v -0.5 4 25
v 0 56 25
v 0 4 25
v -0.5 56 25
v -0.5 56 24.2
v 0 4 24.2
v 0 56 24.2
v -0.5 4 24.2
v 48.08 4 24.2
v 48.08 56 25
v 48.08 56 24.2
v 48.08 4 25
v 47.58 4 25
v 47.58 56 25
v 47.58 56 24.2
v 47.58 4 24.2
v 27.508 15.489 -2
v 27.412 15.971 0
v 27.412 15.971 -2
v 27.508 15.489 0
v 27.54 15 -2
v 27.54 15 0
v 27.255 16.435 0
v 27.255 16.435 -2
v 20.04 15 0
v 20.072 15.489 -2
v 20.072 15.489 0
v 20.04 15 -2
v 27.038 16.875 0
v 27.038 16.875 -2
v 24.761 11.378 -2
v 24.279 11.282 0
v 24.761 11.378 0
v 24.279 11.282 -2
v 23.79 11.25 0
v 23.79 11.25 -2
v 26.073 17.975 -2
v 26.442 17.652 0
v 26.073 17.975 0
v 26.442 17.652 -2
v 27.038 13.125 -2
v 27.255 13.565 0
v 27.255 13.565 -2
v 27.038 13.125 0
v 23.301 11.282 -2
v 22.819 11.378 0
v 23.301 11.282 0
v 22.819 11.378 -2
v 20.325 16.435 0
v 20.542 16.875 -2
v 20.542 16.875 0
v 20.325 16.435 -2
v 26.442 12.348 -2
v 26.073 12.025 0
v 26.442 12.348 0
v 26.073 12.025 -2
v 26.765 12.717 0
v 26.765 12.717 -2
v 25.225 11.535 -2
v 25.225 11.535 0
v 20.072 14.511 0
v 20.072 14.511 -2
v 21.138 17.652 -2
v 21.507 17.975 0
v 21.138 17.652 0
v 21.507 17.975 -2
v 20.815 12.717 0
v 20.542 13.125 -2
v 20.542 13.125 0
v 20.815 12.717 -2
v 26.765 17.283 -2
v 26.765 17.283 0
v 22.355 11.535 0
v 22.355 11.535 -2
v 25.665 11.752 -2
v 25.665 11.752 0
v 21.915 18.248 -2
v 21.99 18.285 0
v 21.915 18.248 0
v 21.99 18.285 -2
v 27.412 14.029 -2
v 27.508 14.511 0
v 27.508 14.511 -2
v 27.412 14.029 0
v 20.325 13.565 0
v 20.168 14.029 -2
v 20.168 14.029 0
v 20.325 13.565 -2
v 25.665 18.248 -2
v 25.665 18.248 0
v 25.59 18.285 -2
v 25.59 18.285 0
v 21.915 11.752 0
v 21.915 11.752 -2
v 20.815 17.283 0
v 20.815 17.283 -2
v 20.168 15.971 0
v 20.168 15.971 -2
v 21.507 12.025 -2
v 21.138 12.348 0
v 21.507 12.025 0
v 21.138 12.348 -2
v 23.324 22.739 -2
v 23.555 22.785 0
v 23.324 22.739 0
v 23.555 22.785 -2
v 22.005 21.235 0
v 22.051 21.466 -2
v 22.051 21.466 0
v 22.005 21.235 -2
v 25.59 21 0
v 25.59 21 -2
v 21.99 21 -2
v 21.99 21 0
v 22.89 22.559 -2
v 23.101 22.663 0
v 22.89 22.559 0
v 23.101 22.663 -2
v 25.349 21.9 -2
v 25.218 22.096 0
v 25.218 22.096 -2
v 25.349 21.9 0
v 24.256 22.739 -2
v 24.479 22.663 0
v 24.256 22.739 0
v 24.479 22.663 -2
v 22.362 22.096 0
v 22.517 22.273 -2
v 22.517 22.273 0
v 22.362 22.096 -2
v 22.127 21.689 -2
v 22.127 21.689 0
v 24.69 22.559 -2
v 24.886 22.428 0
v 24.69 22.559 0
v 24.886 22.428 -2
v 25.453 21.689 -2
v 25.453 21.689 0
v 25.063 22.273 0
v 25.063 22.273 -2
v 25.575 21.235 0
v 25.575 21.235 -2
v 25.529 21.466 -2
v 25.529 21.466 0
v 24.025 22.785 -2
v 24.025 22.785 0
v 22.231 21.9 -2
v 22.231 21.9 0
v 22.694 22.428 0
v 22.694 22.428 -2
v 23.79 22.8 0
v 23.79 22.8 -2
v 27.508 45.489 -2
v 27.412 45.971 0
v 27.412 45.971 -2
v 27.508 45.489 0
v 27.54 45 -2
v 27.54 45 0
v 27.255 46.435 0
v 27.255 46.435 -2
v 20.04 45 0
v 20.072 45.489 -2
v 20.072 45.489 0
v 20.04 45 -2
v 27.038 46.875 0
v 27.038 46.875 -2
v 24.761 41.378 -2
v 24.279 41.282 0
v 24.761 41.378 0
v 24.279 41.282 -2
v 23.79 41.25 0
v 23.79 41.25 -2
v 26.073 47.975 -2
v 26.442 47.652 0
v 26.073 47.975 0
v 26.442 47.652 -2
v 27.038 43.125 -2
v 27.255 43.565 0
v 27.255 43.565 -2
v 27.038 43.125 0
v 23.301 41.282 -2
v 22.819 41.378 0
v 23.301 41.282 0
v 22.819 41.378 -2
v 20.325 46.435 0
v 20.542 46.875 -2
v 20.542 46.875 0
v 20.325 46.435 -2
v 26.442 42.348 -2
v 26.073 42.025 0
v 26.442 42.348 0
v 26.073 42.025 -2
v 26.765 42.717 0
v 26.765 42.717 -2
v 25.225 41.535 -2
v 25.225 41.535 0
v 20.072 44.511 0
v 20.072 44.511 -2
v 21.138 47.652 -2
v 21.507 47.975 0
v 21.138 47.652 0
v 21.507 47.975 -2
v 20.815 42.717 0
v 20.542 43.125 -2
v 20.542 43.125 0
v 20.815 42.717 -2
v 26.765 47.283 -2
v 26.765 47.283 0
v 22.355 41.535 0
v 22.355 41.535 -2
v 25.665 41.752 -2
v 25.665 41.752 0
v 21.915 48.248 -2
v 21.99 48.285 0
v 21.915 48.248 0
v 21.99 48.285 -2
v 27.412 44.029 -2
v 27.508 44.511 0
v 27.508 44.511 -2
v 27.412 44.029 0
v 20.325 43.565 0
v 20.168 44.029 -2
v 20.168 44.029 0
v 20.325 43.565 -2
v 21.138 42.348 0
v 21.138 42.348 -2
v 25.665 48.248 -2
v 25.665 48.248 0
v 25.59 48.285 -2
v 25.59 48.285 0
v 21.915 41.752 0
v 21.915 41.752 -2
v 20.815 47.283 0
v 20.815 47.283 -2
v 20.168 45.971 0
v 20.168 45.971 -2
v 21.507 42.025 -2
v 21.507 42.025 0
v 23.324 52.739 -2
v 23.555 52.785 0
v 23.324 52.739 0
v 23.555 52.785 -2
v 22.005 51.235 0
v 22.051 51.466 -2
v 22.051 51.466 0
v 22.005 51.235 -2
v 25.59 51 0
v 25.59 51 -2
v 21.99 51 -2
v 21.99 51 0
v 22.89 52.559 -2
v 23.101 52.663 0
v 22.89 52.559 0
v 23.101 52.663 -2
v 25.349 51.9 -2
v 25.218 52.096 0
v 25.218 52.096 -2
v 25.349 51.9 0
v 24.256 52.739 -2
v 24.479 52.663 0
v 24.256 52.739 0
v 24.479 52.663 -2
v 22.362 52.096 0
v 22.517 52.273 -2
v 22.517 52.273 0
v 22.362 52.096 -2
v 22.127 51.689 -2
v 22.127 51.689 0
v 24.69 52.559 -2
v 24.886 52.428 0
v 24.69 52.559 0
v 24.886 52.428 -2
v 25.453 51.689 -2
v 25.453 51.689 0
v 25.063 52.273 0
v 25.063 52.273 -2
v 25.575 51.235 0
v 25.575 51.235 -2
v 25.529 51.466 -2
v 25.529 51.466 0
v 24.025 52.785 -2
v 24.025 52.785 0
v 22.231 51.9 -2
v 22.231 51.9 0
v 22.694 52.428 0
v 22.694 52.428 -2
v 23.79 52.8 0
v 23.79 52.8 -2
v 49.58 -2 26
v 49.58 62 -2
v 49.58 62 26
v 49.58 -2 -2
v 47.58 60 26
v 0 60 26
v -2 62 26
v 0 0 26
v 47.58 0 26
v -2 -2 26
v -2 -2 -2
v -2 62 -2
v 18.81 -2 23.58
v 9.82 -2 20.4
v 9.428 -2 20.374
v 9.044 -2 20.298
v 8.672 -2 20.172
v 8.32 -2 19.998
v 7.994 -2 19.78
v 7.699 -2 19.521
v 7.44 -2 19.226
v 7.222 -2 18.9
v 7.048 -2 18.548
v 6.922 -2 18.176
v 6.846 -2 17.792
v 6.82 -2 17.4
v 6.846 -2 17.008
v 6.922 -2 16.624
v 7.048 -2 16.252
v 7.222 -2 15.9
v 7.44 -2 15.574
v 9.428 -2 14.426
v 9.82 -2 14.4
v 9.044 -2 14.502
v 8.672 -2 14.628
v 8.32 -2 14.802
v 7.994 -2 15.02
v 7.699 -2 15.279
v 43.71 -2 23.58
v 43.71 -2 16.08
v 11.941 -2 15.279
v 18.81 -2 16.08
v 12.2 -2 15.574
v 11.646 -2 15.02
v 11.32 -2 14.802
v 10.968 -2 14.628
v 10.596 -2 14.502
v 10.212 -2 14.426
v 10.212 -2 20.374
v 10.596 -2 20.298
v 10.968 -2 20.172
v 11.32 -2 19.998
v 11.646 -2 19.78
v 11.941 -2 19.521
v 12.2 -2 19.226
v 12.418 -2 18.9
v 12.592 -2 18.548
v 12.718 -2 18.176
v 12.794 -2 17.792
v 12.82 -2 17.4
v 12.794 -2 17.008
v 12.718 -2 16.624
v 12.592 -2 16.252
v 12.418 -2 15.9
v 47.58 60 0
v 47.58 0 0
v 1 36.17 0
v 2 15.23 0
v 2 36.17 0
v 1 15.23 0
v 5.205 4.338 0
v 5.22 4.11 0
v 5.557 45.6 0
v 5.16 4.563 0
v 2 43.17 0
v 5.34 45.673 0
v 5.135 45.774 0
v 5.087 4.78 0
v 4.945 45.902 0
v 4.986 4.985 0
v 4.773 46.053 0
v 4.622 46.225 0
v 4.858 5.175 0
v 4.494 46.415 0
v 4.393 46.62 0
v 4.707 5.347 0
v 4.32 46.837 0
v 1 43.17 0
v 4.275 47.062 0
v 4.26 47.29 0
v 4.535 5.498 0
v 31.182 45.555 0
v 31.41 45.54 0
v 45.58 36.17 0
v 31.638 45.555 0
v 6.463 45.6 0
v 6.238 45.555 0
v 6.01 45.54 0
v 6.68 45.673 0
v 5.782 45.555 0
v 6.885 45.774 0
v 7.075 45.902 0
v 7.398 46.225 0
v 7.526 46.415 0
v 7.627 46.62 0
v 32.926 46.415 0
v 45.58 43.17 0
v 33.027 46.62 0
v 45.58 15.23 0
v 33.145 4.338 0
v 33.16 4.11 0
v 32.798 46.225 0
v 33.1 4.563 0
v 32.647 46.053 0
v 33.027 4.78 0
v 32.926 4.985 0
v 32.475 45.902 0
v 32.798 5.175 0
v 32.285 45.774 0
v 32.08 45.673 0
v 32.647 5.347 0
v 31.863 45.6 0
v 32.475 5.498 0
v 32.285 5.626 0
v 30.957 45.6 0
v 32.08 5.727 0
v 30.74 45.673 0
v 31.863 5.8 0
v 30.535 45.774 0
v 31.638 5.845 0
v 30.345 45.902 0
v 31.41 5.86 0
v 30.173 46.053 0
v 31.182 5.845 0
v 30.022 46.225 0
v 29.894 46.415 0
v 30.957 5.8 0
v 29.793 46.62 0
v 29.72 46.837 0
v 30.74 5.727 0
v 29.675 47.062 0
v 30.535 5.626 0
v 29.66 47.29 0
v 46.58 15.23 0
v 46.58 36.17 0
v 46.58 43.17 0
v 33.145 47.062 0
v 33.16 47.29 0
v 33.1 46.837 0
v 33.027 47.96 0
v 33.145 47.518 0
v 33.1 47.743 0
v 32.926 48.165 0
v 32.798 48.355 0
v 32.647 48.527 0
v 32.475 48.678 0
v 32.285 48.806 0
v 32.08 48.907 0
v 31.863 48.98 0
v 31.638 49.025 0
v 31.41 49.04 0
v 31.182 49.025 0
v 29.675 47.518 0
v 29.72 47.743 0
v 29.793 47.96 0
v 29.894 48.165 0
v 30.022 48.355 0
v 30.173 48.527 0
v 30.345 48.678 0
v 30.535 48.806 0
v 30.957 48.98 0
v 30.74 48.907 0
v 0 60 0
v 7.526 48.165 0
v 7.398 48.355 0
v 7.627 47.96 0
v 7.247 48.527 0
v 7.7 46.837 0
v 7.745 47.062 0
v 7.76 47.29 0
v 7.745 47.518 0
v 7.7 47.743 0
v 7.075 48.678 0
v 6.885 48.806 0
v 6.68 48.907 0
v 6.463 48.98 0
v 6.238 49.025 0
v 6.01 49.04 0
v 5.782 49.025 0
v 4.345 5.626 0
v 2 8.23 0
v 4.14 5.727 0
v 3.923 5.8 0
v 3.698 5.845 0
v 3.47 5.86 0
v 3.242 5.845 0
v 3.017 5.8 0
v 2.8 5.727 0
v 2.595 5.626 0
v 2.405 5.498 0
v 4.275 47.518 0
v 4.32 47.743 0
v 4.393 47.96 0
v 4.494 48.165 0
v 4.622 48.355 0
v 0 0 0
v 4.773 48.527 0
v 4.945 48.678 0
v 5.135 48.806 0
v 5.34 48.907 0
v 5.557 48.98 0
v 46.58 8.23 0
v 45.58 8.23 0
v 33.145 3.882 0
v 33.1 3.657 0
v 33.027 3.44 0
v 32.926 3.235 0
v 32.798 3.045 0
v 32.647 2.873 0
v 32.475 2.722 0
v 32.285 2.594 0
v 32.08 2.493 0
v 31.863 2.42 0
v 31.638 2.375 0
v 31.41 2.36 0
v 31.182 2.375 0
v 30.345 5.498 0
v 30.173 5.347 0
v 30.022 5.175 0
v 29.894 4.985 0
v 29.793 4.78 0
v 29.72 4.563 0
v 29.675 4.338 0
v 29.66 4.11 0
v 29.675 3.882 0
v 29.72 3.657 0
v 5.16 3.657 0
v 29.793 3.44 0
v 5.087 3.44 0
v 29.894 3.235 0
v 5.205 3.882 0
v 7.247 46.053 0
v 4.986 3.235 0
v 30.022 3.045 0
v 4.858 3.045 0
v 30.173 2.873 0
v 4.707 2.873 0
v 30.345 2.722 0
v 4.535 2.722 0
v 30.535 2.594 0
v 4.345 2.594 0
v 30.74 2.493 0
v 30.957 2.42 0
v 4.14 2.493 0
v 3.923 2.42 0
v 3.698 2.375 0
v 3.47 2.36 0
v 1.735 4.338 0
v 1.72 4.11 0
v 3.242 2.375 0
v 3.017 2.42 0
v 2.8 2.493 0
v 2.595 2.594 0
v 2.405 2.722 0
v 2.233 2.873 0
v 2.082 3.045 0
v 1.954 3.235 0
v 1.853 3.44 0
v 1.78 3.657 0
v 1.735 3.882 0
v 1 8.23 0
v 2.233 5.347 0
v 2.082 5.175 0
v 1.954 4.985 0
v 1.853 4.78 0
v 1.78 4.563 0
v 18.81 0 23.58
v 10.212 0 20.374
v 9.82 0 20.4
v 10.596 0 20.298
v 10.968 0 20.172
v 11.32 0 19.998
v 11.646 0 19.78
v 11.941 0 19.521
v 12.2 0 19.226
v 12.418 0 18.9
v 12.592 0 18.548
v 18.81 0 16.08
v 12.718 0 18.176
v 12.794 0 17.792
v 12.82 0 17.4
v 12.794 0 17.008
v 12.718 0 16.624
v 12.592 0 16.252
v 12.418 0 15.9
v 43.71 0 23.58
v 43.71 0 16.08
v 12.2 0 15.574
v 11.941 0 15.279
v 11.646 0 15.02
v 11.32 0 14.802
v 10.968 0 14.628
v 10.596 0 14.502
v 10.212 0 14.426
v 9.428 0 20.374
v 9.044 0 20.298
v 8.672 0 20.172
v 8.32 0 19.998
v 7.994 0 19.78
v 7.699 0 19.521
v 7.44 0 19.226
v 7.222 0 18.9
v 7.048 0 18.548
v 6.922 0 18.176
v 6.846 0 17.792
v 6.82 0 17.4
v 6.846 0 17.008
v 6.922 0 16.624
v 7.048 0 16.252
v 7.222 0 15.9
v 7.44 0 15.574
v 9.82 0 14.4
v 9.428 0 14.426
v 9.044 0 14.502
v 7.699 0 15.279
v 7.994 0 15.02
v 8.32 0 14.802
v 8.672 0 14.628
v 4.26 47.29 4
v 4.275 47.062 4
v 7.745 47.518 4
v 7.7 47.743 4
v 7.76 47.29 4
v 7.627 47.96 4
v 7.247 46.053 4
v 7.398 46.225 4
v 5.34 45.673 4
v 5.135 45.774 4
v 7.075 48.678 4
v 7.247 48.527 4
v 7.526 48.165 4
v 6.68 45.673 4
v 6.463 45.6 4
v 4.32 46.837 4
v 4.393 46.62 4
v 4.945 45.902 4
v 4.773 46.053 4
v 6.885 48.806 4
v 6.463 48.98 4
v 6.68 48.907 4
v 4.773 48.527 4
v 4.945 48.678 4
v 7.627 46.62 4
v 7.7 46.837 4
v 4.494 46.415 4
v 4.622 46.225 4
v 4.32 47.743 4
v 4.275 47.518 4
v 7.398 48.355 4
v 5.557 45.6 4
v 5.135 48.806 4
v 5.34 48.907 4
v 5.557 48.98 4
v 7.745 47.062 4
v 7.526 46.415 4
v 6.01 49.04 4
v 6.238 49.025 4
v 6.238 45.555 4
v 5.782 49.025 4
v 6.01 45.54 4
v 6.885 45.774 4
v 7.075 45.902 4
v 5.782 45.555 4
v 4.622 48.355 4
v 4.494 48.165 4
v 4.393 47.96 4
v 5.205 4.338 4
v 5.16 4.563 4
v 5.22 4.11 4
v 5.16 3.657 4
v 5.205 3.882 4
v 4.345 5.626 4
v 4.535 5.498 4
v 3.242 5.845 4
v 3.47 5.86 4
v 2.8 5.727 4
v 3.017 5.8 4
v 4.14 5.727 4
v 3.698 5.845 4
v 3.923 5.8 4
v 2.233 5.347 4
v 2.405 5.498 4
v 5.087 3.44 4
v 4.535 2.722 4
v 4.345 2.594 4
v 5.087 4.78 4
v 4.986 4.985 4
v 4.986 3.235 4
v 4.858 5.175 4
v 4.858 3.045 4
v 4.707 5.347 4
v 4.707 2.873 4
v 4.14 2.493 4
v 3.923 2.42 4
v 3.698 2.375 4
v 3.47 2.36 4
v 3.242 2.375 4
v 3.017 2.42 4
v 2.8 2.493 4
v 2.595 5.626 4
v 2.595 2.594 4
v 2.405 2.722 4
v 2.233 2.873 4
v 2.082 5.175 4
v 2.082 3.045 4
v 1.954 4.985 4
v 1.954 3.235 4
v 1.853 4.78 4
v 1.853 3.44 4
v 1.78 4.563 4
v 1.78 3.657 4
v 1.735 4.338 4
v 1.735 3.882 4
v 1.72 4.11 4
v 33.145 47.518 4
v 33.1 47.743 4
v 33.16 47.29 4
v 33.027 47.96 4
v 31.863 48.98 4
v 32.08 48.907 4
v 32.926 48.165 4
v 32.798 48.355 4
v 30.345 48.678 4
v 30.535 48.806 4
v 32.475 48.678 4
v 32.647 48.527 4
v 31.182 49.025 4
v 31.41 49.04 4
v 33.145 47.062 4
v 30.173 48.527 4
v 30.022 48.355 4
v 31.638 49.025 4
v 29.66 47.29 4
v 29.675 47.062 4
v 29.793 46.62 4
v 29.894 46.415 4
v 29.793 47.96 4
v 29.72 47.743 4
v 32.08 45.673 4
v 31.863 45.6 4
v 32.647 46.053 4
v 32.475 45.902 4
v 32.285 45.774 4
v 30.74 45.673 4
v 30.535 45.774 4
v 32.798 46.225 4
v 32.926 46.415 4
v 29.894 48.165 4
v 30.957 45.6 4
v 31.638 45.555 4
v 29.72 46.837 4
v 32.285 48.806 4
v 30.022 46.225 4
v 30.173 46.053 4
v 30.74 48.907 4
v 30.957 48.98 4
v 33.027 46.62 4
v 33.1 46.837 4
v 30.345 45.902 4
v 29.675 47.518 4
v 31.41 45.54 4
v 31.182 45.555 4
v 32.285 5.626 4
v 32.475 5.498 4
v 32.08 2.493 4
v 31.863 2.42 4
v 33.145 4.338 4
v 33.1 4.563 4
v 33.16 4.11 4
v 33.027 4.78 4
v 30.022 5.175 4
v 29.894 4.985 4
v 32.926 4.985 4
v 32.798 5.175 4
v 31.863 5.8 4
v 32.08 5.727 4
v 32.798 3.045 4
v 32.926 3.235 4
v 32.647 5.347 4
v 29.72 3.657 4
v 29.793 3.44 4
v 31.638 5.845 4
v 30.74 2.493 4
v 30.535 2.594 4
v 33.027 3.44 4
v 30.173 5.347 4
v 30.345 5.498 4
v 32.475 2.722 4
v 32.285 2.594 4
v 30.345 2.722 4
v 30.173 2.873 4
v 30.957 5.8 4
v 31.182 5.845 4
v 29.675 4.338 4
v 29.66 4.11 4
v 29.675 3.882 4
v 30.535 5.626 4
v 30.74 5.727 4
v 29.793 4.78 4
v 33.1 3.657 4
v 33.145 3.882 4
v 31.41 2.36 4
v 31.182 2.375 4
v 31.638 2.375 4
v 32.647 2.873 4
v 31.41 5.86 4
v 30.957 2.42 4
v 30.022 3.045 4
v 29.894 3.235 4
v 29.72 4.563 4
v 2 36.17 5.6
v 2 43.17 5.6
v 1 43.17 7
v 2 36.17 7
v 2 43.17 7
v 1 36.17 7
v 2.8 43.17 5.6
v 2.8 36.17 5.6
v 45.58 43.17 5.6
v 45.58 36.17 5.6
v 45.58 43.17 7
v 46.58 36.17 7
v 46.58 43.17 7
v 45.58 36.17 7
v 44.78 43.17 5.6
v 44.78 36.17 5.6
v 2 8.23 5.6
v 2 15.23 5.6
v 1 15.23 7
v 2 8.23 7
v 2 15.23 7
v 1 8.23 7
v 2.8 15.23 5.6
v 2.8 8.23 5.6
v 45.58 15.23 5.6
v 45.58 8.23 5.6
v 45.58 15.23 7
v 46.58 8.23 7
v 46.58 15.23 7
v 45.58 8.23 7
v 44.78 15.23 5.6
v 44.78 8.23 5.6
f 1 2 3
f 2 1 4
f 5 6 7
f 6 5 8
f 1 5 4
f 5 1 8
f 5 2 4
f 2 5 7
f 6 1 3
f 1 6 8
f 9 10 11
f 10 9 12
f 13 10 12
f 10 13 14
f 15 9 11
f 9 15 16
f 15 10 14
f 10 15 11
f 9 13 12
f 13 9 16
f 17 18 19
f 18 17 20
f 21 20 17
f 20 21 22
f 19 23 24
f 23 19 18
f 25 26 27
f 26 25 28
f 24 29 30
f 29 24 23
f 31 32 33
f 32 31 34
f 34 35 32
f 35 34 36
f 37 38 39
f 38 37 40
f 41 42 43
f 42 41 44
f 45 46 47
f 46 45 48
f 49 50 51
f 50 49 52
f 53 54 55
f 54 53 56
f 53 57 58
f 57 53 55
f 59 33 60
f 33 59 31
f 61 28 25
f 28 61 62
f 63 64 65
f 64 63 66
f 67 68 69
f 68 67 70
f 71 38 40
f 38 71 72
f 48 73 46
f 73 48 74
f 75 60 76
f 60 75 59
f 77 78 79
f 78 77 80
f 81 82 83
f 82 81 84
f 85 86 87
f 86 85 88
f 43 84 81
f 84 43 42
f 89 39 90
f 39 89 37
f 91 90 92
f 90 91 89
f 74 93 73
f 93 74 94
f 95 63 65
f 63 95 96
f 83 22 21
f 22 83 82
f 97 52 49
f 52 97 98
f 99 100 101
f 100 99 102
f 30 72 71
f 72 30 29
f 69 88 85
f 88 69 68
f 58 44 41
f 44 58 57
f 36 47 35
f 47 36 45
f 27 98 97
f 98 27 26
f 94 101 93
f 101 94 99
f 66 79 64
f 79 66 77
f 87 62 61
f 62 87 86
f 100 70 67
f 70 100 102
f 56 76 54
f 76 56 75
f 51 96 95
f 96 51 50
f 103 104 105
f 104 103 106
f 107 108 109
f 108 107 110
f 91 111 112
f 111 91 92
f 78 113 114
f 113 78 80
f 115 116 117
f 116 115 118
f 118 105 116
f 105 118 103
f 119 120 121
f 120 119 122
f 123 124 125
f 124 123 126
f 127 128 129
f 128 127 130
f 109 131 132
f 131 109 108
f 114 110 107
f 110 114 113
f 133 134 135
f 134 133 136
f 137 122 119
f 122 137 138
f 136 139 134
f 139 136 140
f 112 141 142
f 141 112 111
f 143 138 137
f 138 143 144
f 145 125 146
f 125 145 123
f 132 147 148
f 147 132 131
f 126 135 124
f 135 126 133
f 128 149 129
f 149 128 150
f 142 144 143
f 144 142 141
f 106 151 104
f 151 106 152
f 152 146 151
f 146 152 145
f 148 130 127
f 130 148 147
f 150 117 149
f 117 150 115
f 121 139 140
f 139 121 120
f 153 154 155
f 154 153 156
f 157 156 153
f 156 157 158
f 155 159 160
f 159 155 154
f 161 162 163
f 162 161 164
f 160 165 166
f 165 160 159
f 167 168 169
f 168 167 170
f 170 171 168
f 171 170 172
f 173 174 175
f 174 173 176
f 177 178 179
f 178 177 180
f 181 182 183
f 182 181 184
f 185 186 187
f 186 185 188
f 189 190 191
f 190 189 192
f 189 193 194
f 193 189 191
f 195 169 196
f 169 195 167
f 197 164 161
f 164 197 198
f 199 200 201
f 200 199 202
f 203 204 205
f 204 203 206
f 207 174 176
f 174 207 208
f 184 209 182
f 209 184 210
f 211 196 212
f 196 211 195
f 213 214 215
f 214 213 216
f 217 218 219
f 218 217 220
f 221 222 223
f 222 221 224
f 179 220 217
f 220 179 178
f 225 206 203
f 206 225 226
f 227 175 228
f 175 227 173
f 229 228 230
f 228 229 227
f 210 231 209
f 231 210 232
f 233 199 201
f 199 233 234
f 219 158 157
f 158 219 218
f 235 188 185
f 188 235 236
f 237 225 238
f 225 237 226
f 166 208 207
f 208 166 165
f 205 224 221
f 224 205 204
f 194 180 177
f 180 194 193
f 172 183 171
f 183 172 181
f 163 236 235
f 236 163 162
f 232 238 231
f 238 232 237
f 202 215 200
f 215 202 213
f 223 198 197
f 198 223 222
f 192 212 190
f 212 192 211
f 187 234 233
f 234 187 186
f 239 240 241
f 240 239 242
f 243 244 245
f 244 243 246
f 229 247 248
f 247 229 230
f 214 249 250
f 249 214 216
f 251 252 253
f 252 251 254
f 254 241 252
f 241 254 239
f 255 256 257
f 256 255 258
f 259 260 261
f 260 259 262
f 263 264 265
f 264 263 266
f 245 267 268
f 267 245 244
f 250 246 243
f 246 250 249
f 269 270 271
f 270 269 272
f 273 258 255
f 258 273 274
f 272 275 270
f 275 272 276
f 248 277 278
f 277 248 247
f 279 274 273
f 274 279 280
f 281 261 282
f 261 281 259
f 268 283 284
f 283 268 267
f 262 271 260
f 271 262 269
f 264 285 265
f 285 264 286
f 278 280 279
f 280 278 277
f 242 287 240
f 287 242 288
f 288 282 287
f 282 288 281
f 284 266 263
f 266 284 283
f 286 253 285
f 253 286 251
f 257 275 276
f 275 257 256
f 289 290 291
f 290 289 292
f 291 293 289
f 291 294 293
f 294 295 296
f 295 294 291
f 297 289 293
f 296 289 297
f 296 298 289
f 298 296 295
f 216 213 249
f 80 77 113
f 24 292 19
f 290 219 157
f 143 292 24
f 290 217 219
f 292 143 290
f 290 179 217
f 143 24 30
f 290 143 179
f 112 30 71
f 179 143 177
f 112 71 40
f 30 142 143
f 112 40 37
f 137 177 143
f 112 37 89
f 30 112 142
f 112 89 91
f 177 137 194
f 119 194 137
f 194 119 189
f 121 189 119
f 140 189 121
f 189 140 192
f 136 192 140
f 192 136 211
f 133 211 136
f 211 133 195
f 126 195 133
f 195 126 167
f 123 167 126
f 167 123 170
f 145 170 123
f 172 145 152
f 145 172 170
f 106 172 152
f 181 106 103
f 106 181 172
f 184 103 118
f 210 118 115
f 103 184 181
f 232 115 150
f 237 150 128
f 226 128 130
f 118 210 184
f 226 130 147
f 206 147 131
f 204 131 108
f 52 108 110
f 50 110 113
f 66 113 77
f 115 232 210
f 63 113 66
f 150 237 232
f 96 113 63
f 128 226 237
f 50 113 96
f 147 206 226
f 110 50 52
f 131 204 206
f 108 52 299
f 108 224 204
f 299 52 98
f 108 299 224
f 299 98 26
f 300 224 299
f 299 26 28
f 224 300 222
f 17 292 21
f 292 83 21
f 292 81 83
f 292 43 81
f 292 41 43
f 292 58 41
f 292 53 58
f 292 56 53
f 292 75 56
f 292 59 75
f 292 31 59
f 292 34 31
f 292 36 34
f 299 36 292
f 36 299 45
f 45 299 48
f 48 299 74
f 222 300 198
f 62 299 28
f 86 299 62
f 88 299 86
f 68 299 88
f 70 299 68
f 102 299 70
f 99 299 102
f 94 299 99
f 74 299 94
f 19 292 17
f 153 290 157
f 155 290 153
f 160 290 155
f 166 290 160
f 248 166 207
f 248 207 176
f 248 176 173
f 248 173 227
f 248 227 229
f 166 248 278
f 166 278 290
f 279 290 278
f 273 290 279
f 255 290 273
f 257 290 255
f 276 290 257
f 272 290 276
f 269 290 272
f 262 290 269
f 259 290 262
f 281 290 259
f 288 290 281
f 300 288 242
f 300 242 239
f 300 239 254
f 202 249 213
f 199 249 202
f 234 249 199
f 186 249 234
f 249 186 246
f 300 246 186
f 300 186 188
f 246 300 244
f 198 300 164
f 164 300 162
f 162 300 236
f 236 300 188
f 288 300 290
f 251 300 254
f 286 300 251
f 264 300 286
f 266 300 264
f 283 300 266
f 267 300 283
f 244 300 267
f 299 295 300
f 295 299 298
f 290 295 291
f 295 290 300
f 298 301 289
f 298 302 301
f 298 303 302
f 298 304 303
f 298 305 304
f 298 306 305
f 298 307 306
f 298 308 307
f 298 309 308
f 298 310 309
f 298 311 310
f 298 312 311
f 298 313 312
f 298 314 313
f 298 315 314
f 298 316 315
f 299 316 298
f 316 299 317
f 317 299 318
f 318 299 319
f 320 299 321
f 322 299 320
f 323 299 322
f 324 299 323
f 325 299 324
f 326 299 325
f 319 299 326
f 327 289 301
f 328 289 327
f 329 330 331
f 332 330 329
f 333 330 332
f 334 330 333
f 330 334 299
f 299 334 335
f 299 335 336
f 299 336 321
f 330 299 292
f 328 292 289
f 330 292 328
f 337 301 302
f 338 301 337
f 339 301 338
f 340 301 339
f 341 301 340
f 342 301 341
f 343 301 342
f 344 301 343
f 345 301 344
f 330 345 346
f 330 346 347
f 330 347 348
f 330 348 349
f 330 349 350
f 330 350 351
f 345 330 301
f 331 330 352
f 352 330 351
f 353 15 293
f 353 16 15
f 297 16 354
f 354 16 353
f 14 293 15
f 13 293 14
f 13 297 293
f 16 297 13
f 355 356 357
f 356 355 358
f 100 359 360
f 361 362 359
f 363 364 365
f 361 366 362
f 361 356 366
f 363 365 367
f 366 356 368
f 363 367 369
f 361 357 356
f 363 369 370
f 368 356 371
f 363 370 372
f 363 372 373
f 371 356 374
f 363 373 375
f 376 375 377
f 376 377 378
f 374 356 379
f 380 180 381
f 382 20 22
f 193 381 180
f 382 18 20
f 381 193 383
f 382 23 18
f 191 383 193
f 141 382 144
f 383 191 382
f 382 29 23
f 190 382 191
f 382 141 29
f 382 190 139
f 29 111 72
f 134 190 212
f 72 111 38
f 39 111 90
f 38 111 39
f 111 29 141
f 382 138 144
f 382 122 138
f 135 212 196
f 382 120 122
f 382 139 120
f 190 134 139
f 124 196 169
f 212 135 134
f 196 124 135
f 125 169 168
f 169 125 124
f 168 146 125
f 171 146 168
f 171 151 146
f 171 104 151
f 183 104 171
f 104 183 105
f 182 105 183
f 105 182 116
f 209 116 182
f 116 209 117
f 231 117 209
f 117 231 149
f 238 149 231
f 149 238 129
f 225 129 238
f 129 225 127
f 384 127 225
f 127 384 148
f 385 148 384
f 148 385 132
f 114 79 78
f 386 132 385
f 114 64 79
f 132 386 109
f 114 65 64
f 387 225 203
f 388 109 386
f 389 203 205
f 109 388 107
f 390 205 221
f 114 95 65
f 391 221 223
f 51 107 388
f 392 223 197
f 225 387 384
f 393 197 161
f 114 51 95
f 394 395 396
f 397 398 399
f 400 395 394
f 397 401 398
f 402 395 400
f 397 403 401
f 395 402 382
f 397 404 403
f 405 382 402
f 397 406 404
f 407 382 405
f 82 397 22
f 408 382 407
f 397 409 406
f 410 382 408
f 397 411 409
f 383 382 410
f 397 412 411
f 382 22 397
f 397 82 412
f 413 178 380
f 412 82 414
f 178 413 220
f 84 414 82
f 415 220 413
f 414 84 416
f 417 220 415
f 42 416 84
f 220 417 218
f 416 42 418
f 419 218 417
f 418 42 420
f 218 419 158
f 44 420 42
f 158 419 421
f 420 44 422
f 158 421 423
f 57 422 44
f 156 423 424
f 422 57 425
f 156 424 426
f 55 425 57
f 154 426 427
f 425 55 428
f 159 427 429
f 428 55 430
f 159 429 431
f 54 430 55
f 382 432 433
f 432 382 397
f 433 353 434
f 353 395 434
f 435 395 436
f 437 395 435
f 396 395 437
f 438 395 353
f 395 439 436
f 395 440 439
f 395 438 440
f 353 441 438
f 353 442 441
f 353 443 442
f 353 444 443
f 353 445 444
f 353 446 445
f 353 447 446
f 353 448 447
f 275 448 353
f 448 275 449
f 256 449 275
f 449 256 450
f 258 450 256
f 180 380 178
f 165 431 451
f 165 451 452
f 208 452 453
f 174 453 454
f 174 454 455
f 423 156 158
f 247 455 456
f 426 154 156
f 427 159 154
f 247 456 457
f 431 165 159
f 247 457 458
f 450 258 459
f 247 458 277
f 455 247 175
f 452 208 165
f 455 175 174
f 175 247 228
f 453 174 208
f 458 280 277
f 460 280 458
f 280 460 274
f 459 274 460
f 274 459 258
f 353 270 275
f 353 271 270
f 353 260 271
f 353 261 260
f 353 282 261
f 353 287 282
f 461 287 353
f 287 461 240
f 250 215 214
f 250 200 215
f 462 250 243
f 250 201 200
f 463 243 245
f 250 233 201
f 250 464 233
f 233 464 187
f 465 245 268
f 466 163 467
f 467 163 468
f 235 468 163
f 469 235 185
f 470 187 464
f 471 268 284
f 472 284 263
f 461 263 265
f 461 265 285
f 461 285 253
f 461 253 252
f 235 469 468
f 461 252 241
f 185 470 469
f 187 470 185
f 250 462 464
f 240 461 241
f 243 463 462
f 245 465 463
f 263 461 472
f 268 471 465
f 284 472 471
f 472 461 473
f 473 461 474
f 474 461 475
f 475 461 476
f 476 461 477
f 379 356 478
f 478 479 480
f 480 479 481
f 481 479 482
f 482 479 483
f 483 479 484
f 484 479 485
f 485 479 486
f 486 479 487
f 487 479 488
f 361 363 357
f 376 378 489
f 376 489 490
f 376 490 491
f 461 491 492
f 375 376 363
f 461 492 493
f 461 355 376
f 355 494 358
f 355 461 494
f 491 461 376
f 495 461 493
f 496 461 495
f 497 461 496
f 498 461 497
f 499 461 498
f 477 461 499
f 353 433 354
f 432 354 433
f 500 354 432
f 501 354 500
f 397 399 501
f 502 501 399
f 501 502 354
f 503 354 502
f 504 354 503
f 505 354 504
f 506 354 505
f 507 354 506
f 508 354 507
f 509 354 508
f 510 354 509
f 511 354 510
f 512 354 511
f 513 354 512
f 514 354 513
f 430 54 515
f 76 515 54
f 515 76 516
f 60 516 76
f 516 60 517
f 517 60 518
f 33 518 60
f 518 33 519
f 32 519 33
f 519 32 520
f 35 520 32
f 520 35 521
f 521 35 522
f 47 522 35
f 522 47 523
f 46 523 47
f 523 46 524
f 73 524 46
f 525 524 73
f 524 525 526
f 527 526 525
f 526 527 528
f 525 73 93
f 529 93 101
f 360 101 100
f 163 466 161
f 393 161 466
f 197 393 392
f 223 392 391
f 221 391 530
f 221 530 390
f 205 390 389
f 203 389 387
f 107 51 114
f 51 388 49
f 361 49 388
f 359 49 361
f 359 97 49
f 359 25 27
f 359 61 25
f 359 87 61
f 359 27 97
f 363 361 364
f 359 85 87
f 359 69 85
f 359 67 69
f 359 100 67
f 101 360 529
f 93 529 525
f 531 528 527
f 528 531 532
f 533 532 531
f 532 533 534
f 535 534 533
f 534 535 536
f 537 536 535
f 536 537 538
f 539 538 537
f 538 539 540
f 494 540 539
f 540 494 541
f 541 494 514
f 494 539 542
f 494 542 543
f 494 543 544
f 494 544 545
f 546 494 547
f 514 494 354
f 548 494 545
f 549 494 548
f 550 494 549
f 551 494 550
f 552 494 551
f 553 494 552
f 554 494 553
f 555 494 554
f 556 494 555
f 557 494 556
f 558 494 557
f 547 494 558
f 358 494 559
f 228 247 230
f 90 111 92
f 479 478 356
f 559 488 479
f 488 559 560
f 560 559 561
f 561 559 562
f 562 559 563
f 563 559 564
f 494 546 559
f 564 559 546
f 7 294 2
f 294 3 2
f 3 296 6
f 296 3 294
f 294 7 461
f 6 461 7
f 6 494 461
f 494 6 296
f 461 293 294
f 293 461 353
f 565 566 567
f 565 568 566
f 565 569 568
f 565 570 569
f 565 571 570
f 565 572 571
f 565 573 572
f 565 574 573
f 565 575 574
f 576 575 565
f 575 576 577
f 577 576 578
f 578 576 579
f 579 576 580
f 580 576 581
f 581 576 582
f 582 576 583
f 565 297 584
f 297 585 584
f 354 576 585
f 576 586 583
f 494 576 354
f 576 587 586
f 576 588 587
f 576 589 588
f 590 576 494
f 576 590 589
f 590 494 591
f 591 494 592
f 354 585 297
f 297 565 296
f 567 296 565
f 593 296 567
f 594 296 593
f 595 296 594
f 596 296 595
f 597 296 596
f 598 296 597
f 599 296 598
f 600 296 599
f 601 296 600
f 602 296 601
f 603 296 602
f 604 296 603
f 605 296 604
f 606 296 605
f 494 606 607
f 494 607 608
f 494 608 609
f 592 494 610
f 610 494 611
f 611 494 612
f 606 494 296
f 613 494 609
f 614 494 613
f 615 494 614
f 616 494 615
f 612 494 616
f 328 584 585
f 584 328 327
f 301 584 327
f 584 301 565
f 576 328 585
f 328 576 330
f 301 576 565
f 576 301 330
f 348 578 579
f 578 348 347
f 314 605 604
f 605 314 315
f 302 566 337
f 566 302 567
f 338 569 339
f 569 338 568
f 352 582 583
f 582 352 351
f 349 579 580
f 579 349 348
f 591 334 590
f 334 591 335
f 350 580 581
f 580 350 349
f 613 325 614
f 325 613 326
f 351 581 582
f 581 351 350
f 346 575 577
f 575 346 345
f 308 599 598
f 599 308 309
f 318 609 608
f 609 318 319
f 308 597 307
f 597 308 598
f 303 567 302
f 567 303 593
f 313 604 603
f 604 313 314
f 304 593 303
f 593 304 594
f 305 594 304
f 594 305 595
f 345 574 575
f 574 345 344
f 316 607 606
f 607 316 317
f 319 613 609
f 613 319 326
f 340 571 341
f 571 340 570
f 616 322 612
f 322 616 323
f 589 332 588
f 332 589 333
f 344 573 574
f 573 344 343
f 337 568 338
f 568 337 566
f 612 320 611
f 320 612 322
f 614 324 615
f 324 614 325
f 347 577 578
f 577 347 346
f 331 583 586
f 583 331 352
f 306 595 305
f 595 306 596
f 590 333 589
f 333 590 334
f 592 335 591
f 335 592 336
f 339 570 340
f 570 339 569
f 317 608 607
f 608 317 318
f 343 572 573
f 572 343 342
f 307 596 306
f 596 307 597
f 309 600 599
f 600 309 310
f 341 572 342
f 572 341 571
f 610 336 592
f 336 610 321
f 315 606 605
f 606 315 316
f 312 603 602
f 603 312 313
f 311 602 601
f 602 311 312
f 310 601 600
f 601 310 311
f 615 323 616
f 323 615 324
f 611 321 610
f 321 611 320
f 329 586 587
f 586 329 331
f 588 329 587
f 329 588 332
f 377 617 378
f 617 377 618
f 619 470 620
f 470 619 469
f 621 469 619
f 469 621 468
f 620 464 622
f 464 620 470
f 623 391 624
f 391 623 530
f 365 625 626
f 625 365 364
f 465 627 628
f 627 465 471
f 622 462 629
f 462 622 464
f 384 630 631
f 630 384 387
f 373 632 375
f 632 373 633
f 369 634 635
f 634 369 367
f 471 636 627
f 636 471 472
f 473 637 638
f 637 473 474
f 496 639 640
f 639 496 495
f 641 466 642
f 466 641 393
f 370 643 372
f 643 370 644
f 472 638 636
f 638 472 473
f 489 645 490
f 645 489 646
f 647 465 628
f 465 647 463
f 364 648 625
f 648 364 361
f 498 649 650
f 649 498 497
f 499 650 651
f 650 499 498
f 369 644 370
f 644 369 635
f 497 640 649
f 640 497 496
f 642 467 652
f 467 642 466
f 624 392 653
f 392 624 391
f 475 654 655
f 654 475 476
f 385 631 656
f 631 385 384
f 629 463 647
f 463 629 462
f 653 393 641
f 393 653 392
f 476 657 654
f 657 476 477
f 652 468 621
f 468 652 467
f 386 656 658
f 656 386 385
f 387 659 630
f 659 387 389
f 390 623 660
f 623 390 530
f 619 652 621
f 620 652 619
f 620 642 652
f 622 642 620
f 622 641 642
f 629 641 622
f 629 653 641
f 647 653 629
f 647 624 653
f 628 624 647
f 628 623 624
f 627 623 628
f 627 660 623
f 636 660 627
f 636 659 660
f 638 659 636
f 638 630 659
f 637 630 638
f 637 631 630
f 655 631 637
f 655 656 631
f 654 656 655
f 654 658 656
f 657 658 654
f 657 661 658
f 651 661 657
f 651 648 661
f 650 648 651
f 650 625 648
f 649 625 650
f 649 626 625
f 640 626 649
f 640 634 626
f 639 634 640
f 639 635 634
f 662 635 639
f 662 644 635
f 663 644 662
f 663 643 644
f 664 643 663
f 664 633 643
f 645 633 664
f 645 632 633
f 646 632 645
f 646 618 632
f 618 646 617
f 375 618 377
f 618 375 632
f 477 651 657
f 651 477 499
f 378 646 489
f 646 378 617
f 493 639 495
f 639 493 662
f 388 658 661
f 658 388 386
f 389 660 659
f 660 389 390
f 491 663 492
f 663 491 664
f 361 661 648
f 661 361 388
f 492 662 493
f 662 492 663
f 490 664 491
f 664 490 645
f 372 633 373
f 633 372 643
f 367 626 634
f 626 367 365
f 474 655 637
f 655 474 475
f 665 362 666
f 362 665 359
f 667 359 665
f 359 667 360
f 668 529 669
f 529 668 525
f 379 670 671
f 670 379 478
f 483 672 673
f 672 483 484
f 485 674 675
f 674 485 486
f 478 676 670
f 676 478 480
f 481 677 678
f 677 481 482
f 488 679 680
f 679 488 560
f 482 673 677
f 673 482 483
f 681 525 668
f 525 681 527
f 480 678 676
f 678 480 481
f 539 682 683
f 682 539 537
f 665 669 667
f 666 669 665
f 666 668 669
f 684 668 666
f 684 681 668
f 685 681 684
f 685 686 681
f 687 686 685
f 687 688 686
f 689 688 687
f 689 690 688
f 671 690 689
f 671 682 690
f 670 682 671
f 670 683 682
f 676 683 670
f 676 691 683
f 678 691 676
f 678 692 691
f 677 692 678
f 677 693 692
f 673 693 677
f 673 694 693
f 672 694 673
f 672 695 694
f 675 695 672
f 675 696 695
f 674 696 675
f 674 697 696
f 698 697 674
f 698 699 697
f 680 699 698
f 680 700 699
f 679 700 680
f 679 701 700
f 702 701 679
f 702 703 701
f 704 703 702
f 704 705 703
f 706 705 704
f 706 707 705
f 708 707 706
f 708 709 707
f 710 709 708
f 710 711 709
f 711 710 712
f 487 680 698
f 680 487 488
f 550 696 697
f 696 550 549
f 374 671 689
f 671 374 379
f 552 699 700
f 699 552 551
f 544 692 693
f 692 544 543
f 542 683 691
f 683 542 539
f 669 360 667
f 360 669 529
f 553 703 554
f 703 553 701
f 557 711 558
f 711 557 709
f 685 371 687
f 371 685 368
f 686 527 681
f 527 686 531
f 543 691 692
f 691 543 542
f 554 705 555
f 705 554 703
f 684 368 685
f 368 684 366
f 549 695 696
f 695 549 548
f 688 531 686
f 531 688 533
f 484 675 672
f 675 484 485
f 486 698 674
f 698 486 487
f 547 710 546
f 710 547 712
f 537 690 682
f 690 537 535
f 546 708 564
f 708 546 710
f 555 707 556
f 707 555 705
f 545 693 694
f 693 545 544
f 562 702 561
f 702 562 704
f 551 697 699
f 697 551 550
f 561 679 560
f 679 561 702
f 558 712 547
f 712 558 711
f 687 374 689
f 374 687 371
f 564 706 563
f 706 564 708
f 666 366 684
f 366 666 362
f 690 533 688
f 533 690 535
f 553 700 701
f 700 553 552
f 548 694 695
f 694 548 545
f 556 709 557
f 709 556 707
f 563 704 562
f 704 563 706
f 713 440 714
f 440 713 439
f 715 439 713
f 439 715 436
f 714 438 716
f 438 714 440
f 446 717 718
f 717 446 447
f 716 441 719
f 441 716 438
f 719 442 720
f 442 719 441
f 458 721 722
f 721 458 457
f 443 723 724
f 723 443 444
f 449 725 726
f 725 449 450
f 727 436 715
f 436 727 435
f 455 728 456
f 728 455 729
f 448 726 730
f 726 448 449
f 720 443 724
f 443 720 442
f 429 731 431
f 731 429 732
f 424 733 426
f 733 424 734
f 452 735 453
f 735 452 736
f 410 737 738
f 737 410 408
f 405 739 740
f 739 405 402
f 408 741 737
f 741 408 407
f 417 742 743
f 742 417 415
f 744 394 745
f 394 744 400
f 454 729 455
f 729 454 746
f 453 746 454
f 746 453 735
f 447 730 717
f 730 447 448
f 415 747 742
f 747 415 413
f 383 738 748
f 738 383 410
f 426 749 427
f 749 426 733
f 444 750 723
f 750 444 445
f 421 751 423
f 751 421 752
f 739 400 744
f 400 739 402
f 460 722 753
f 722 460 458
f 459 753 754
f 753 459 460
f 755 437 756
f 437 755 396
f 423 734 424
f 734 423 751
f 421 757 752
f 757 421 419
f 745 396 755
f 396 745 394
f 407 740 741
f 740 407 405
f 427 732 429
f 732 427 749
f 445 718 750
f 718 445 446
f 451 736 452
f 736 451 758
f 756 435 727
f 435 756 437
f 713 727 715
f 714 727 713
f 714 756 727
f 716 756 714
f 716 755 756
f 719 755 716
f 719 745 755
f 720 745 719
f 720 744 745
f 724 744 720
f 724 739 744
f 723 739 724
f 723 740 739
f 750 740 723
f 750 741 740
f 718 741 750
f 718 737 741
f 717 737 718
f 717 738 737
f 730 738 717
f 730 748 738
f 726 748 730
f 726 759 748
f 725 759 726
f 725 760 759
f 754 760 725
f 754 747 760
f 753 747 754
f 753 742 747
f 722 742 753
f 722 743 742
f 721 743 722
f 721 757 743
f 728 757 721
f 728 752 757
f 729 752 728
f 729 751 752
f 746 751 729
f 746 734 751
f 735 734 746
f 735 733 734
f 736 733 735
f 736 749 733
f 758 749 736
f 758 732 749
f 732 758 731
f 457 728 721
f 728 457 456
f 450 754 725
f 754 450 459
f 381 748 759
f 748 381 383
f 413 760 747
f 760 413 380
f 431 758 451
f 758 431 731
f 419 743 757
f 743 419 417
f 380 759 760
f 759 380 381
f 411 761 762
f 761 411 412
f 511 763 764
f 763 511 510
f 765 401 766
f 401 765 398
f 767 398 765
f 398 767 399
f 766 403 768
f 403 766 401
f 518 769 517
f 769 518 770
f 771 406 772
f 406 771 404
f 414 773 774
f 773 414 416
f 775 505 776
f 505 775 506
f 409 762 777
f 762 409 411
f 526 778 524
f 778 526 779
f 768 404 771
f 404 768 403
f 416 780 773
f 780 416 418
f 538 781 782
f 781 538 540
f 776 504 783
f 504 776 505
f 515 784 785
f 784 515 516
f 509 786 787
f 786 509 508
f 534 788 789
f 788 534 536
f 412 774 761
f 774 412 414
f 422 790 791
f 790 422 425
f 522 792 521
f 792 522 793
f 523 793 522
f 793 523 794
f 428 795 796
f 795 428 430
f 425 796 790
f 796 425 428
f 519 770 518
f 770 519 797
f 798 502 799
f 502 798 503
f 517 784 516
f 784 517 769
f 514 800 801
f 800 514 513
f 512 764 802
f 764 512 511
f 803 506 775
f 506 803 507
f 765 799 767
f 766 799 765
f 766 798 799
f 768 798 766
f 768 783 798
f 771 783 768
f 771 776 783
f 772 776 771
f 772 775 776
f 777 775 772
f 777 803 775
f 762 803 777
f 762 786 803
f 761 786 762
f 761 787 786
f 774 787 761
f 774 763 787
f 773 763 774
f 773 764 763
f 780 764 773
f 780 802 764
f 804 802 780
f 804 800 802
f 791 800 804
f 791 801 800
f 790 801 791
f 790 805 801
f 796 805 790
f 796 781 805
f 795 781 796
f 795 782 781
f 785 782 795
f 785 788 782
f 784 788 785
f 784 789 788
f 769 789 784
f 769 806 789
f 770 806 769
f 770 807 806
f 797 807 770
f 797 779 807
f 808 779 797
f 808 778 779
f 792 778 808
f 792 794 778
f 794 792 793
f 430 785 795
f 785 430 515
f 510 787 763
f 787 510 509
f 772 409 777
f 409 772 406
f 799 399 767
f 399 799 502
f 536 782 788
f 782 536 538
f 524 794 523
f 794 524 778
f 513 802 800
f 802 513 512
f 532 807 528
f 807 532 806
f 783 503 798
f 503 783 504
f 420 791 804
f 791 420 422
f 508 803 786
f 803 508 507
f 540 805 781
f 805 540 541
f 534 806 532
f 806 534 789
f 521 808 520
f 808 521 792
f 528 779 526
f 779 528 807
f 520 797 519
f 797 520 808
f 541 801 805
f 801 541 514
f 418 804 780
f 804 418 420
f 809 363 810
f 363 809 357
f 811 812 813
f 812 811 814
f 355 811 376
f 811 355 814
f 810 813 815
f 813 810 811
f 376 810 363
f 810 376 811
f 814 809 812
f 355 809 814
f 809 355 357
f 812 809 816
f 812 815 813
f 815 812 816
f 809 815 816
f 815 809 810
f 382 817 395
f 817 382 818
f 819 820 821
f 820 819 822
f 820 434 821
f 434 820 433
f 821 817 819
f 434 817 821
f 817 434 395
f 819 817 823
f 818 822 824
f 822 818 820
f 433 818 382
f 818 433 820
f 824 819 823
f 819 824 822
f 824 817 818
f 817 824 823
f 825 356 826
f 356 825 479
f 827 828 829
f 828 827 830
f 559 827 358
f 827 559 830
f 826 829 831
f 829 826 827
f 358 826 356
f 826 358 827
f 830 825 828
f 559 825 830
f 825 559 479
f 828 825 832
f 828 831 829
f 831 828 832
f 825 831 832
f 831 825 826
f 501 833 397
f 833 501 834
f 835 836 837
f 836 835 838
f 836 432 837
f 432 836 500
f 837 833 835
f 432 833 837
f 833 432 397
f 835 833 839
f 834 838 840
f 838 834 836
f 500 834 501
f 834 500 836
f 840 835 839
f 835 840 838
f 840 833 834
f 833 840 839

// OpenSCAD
// Fireplace RF case: Freenove ESP32-S3 WROOM + Ebyte E07-M1101D (CC1101) on a
// 17 x 20 hole perfboard. Print in PETG or ASA. Render with part = "base" / "lid".
//
// Coordinates: interior origin at the inside corner of the connector end wall,
// left wall and floor. X = width, Y = length (connector end at Y = 0), Z = up.
// Perfboard rows run 0 (antenna end) to 19 (connector end); columns 0 (left) to 16.

part = "base";            // "base", "lid" or "assembly"
$fn = 48;

// ---- Measured parts ----
pitch = 2.54;
pb_cols = 17;  pb_rows = 20;
pb_w = pb_cols * pitch;   // 43.18
pb_l = pb_rows * pitch;   // 50.8
pb_t = 1.6;
header_h = 8.5;           // female header body
pin_plastic = 2.5;        // male header spacer under each module
esp_w = 27.8;  esp_l = 50.6;  esp_ant = 6;  esp_pin_inset = 1.2;
usb_from_left = [7.8, 19.7];   // USB-C centres from the ESP32's left edge (from photo, +/-1 mm)
usb_h = 3.26;
cc_w = 15;  cc_l = 28;

// ---- Case ----
wall = 2;  floor_t = 2;  lid_t = 2;
gap = 0.3;                // perfboard to connector wall
pb_side = 2.2;            // room each side for the snap hooks
pb_z = 4;                 // perfboard underside above the floor (solder side clearance)
in_w = pb_w + 2 * pb_side;
in_l = gap + pb_l + esp_ant + 2.9;
in_h = 26;

antenna_hole_d = 6.0;     // as measured. SMA thread is nominally 6.35 mm: drill out if tight
usb_open_w = 13;          // per plug overmould
usb_open_h = 7.5;

function col(c) = pb_side + pitch / 2 + c * pitch;
function row(r) = gap + pitch / 2 + (pb_rows - 1 - r) * pitch;

pb_top = pb_z + pb_t;
module_bottom = pb_top + header_h + pin_plastic;    // underside of both modules
esp_top = module_bottom + 1.6;
esp_left = col(6) - esp_pin_inset;                  // ESP32 header rows in columns 6 and 16
usb_z = esp_top + usb_h / 2;
sma_x = col(2.5);                                   // CC1101 header in columns 1-4, rows 9-10
sma_z = module_bottom + 0.8;

posts = [[1, 1], [0, 18], [11, 1], [11, 18]];       // free holes: route wires around these
hook_rows = [4, 15];

module base() {
  difference() {
    translate([-wall, -wall, -floor_t])
      cube([in_w + 2 * wall, in_l + 2 * wall, floor_t + in_h]);
    cube([in_w, in_l, in_h + 1]);
    // USB-C: one opening for both ports
    translate([esp_left + usb_from_left[0] - usb_open_w / 2, -wall - 1, usb_z - usb_open_h / 2])
      cube([usb_from_left[1] - usb_from_left[0] + usb_open_w, wall + 2, usb_open_h]);
    // Antenna SMA
    translate([sma_x, 1, sma_z]) rotate([90, 0, 0]) cylinder(d = antenna_hole_d, h = wall + 2);
    // Lid snap grooves along the long walls
    for (x = [-0.5, in_w - 0.5])
      translate([x, 4, in_h - 1.8]) cube([1, in_l - 8, 0.8]);
    // Keyholes for wall mounting (M3/#6 pan head)
    for (y = [in_l * 0.25, in_l * 0.75]) translate([in_w / 2, y, -floor_t - 1]) {
      cylinder(d = 7.5, h = floor_t + 2);
      hull() for (dy = [0, 6]) translate([0, dy, 0]) cylinder(d = 3.6, h = floor_t + 2);
    }
  }
  // Support posts under the perfboard
  for (p = posts) translate([col(p[0]), row(p[1]), 0]) cylinder(d = 3.5, h = pb_z);
  // Snap hooks holding the perfboard's long edges
  for (r = hook_rows) {
    translate([pb_side, row(r), 0]) hook();
    translate([in_w - pb_side, row(r), 0]) mirror([1, 0, 0]) hook();
  }
}

// Cantilever arm standing in the side gap; the lip catches the perfboard edge.
module hook() {
  arm = 1.0;  lip = 0.8;  w = 7;
  translate([-0.2 - arm, -w / 2, 0]) {
    cube([arm, w, pb_top + 1.4]);
    // lip with a lead-in ramp above it
    translate([arm, 0, pb_top])
      rotate([-90, 0, 0]) linear_extrude(w)
        polygon([[0, 0], [lip, 0], [0, -1.4]]);
  }
}

module lid() {
  lip = 1.2;  lip_h = 3;  clr = 0.2;
  translate([-wall, -wall, 0]) cube([in_w + 2 * wall, in_l + 2 * wall, lid_t]);
  // Lips on the long walls only: the end walls carry the connector openings
  for (side = [0, 1]) {
    x = side == 0 ? clr : in_w - clr - lip;
    translate([x, 5, -lip_h]) {
      cube([lip, in_l - 10, lip_h]);
      // snap bead into the wall groove
      bx = side == 0 ? 0 : lip;
      translate([bx, 0, 1.8 - 0.8 + 0.4]) rotate([-90, 0, 0]) cylinder(d = 0.8, h = in_l - 10, $fn = 16);
    }
  }
}

// Ghost boards for checking fit (assembly view only)
module boards() {
  color("tan", 0.6) translate([pb_side, gap, pb_z]) cube([pb_w, pb_l, pb_t]);
  color("red", 0.6) translate([esp_left, gap + (pb_l - esp_l) / 2, module_bottom]) {
    cube([esp_w, esp_l, 1.6]);
    translate([(esp_w - 18) / 2, esp_l, 0]) cube([18, esp_ant, 3.1]);
    for (u = usb_from_left) translate([u - 4.5, 0, 1.6]) cube([9, 7.5, usb_h]);
  }
  color("blue", 0.6) translate([sma_x - cc_w / 2, gap, module_bottom]) {
    cube([cc_w, cc_l, 1.6]);
    translate([cc_w / 2, 0, 0.8]) rotate([90, 0, 0]) cylinder(d = 6.35, h = 9.45);
  }
}

if (part == "base") base();
else if (part == "lid") rotate([180, 0, 0]) lid();   // printed upside down, flat face on the bed
else { base(); boards(); translate([0, 0, in_h]) %lid(); }
